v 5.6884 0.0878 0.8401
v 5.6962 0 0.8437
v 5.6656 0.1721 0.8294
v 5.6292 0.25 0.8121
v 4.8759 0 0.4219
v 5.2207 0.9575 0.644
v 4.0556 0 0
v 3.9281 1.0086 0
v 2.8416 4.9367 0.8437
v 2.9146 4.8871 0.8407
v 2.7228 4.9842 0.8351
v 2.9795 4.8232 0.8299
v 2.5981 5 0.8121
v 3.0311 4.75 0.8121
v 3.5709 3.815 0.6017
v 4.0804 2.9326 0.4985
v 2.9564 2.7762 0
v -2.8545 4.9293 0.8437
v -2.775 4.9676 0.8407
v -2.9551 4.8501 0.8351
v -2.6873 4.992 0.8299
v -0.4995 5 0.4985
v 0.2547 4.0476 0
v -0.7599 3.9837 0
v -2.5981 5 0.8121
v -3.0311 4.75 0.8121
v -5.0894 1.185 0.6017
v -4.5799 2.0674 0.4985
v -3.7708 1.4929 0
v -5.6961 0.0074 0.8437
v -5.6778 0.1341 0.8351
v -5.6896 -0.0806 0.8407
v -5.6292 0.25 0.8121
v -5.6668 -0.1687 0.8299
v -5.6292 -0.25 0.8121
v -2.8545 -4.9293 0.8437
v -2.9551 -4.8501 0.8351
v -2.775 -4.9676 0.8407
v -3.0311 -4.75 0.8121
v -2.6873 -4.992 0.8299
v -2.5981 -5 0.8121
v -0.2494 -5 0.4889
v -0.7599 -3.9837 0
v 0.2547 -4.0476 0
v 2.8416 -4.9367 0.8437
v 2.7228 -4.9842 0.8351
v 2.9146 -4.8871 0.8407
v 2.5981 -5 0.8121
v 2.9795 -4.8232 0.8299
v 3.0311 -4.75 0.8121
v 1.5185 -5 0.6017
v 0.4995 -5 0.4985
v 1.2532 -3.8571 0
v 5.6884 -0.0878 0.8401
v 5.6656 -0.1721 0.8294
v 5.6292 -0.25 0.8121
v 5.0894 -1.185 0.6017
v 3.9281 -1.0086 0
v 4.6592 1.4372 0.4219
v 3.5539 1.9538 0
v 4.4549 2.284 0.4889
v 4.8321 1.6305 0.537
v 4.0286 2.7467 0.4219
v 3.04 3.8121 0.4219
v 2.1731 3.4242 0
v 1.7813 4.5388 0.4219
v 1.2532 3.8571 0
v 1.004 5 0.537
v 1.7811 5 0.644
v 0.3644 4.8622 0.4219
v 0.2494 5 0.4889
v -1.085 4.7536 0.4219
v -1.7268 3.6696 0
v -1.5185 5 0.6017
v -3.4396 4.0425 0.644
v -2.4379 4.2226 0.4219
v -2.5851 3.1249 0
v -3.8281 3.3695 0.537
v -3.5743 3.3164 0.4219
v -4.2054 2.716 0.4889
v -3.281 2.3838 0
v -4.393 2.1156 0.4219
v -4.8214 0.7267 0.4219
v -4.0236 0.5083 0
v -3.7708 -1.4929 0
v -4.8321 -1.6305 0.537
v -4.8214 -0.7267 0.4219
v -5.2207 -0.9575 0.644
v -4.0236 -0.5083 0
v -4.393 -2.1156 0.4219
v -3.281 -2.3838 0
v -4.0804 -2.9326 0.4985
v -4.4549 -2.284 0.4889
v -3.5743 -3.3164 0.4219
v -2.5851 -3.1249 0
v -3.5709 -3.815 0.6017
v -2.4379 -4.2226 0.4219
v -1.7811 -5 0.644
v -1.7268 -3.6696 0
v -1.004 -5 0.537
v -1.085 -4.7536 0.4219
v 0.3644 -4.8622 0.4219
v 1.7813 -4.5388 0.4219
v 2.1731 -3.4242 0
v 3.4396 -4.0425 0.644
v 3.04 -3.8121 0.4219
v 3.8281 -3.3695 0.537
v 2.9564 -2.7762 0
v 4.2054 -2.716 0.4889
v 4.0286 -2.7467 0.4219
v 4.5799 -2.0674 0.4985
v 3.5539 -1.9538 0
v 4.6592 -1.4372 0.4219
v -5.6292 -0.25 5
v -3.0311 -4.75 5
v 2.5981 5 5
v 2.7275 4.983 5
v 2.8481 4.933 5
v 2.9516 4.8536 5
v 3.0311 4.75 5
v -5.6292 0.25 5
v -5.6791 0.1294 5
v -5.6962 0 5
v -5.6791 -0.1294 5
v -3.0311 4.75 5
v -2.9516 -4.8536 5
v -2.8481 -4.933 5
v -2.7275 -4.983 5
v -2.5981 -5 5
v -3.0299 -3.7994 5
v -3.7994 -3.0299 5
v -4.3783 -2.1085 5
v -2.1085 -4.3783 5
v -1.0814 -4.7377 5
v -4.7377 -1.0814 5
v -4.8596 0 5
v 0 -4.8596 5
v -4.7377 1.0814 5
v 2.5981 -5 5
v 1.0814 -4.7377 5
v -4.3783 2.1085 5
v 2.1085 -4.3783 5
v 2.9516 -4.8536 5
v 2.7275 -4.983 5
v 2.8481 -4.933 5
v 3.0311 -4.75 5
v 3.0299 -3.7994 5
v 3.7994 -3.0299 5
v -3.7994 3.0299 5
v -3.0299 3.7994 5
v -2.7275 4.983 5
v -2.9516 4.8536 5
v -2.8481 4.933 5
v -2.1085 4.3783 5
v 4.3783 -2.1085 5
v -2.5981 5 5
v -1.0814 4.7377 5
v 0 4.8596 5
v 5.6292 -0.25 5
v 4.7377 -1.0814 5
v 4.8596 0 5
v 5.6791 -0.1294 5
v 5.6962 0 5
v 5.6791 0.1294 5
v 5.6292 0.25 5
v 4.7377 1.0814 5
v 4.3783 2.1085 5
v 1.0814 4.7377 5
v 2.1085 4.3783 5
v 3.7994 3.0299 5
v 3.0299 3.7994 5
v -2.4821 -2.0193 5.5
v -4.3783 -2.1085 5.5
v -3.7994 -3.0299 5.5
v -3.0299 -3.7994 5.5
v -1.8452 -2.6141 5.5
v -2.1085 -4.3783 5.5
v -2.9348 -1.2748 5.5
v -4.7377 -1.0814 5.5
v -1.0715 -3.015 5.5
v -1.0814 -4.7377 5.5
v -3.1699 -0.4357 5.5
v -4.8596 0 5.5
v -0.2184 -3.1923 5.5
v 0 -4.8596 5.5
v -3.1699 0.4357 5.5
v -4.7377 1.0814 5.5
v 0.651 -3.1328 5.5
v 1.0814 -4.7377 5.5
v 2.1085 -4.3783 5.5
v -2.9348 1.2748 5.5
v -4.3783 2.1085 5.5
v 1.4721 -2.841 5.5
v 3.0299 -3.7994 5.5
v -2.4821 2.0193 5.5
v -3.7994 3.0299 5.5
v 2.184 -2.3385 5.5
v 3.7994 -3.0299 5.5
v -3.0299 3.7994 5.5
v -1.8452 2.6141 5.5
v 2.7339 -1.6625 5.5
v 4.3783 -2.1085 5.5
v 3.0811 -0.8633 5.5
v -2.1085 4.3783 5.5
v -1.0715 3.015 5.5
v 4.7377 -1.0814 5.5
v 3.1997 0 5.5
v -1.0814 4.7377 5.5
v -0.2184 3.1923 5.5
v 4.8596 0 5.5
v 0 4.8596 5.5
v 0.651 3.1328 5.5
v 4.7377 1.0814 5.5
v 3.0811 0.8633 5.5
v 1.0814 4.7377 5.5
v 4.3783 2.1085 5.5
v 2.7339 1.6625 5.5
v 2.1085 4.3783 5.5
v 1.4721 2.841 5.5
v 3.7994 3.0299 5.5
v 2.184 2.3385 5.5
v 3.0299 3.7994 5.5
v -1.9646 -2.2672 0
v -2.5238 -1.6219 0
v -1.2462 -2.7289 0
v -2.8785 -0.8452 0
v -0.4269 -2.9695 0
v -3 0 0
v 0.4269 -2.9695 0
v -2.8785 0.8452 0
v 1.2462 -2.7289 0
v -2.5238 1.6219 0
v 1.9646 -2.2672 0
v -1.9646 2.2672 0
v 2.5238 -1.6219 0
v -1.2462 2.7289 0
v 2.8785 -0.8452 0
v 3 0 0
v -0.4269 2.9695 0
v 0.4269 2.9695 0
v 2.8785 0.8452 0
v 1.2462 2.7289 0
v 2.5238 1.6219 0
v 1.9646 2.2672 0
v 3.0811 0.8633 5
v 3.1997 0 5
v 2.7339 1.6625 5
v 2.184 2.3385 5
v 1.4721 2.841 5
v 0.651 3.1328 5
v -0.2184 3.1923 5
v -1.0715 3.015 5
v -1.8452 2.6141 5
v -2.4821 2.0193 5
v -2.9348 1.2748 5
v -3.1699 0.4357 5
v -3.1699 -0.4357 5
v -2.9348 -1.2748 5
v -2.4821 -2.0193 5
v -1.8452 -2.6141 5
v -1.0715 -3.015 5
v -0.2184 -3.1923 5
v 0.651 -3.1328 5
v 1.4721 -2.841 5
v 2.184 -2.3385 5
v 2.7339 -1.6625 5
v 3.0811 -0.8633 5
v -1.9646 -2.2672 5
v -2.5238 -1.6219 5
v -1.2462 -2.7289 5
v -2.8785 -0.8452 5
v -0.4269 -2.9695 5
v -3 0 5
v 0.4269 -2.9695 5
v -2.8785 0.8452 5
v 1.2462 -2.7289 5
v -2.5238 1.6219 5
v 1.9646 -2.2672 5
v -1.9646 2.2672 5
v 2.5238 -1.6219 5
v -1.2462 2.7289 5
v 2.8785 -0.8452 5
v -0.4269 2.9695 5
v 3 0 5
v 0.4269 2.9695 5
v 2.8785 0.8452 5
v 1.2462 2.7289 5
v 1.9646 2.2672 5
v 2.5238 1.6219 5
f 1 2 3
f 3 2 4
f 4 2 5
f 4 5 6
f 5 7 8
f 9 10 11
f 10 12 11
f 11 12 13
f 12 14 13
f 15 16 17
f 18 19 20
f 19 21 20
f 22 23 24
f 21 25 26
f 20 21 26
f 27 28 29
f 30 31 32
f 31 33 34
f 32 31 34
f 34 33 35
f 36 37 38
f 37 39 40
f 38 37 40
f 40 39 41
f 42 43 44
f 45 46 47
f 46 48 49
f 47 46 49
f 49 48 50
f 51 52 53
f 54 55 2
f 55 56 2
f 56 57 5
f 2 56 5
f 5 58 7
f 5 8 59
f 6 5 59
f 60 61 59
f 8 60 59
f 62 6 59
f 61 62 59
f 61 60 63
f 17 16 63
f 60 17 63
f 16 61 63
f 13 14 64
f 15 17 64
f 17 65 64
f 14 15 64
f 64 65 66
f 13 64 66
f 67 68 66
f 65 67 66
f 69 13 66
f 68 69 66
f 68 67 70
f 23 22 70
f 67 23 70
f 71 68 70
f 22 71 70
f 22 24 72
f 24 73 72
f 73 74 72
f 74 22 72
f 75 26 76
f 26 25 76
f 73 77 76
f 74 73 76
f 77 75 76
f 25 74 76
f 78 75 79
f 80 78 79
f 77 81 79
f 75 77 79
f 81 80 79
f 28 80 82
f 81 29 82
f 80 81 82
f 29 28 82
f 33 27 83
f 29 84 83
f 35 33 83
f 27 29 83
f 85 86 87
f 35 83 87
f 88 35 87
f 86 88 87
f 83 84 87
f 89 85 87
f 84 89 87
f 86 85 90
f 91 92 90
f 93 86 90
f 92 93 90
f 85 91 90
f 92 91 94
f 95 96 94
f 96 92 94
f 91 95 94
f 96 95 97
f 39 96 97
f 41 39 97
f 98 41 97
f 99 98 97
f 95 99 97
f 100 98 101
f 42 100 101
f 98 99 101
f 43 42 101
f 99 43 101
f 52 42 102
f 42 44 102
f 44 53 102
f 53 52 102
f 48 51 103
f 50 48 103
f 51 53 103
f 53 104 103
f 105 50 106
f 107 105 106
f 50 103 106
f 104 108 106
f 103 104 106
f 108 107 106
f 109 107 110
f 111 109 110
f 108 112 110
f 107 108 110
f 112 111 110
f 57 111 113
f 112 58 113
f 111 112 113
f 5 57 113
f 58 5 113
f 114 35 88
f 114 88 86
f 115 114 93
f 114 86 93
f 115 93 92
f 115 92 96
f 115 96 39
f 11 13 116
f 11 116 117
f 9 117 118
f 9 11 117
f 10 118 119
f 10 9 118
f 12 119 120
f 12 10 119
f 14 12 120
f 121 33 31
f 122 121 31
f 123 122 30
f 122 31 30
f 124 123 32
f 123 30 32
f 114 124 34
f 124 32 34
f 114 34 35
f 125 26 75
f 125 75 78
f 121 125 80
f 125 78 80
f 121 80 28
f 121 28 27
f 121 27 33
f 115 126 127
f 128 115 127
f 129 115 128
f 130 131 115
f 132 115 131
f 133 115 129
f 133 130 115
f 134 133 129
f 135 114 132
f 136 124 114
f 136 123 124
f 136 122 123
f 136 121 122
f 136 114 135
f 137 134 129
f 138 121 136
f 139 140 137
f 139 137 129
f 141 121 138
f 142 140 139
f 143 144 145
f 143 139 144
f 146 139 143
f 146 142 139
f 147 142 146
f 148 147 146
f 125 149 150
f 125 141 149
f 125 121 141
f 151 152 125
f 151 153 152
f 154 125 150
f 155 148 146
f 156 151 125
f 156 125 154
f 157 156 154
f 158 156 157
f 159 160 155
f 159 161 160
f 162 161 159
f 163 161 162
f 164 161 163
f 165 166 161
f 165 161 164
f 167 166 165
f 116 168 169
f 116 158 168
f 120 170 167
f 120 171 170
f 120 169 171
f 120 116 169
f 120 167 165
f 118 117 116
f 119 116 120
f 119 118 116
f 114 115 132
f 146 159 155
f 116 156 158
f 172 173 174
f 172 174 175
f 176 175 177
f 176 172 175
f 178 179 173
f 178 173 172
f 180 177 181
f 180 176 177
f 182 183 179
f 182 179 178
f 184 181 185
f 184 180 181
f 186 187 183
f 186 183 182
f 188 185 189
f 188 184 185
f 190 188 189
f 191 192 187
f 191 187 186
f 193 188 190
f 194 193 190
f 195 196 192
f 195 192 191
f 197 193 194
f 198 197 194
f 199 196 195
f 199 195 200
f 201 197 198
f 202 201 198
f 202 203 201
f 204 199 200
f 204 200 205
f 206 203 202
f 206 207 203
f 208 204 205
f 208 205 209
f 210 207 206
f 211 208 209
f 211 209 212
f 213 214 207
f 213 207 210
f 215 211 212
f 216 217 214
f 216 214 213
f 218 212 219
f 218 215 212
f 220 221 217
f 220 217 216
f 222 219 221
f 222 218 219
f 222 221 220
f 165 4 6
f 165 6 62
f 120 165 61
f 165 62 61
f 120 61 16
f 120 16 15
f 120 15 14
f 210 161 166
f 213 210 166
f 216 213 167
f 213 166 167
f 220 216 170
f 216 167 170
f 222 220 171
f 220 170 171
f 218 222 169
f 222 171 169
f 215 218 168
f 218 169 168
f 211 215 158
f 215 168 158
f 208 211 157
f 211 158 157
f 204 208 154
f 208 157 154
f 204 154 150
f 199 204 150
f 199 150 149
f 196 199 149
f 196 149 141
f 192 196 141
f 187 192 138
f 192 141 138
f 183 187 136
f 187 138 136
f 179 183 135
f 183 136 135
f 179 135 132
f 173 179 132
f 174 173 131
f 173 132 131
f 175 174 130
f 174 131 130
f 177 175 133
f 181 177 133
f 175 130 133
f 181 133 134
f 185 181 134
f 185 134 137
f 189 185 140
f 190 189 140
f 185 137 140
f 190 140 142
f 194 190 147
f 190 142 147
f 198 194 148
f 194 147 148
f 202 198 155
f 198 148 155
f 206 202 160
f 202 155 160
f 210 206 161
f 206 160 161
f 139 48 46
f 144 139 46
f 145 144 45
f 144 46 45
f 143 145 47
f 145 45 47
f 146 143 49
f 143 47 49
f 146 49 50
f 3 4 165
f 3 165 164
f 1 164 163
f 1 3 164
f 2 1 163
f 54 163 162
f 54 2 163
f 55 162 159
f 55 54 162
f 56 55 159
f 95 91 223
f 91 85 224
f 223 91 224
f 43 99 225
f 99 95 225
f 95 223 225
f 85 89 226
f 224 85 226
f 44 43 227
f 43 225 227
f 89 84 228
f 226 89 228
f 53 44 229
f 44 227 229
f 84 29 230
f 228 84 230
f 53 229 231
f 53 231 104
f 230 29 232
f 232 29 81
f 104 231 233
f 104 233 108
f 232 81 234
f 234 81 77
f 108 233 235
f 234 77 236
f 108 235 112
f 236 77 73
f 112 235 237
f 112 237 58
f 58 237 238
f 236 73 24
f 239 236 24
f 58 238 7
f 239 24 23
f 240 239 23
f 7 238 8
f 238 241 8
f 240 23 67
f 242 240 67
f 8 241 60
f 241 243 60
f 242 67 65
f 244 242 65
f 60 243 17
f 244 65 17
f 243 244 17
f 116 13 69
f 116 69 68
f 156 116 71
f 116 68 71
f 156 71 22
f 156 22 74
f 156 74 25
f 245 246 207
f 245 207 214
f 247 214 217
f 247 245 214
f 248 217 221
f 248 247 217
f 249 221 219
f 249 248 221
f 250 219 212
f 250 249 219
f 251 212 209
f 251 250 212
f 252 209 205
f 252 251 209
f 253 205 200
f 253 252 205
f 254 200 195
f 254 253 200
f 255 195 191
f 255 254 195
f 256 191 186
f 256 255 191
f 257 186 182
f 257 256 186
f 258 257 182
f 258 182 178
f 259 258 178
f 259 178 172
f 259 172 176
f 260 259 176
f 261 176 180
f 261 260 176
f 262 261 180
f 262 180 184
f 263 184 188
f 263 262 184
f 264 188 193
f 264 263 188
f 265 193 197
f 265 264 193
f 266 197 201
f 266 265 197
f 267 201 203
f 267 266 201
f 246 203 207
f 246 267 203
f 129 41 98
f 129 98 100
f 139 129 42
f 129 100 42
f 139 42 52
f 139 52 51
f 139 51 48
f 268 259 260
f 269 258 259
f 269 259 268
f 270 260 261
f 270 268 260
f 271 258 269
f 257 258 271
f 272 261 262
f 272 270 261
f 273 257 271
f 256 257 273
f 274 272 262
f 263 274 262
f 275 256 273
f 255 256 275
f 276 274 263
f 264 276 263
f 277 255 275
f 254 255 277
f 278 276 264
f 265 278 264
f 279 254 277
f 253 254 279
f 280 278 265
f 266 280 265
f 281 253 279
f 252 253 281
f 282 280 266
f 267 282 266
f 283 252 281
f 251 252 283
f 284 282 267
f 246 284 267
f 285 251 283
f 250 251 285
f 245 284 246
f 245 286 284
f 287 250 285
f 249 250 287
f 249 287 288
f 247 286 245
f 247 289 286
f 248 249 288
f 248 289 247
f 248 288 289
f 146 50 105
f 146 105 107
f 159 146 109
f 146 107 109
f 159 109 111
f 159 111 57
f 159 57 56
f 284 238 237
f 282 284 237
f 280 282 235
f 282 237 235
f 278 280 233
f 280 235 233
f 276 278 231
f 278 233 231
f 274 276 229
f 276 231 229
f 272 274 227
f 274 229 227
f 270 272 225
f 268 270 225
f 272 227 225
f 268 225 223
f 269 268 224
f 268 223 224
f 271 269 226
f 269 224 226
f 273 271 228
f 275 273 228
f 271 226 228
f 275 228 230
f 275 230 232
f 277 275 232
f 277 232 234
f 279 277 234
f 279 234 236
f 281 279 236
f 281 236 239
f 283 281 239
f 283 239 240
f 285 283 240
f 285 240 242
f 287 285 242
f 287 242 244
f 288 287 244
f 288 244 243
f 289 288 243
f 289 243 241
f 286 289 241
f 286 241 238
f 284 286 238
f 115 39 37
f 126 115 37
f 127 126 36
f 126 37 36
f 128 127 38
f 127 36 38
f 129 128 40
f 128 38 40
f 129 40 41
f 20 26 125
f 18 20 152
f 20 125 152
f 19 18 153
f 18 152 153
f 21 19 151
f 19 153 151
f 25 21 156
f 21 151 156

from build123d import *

# Parameters (mm, degrees)
F1_DEPTH    = 5
F4_R        = 3
F5_DEPTH    = 5.001
F6_R        = 0.5
F7_T1_DEPTH = 5.5598599904
F9_R        = 4.8595532258
F9_R_2      = 3.1997304912
F10_DEPTH   = 0.5


# Not quite as in the source:
# - a fillet or chamfer that OpenCascade refuses, or shapes differently, is made with other operations: its cross-section is extruded or revolved along the edge and cut away or added


with BuildPart() as f1:
    # F0 (on Top) → F1 (new body)
    with BuildSketch(Plane.XY):
        Polygon((-2.8867513459, 5), (-5.7735026919, 0), (-2.8867513459, -5), (2.8867513459, -5), (5.7735026919, 0), (2.8867513459, 5), align=None)
    extrude(amount=F1_DEPTH)

    # F2 (on Front) → F3 (revolve, cut)
    with BuildSketch(Plane.XZ):
        Polygon((6, 1), (3.5, -0.285714148), (6, -0.285714148), align=None)
    revolve(axis=Axis((0, 0, 1.7616122495), (0, 0, 1)), mode=Mode.SUBTRACT)

    # F4 (on face) → F5 (cut, through all)
    with BuildSketch(Plane(origin=(0, 0, 0), x_dir=(1, 0, 0), z_dir=(0, 0, -1))):
        Circle(F4_R)
    extrude(amount=-F5_DEPTH, mode=Mode.SUBTRACT)

    # F6
    f6_edges = [f1.edges().sort_by_distance(p)[0] for p in [
        (-2.886751, 5, 2.941758),
    ]]
    fillet(f6_edges, radius=F6_R)

    # F7: fillet of radius 0.5 on 5 edges, made by hand

    # F7_s2 → F7_t1 (cut)
    with BuildSketch(Plane.XY.offset(0.1618278461)):
        with BuildLine():
            ThreePointArc((-5.6291651246, 0.25), (-5.6961524227, 0), (-5.6291651246, -0.25))
            Line((-5.6291651246, -0.25), (-5.7735026919, 0))
            Line((-5.7735026919, 0), (-5.6291651246, 0.25))
        make_face()
        with BuildLine():
            ThreePointArc((-3.0310889132, -4.75), (-2.8480762114, -4.9330127019), (-2.5980762114, -5))
            Line((-2.5980762114, -5), (-2.8867513459, -5))
            Line((-2.8867513459, -5), (-3.0310889132, -4.75))
        make_face()
        with BuildLine():
            ThreePointArc((2.5980762114, -5), (2.8480762114, -4.9330127019), (3.0310889132, -4.75))
            Line((3.0310889132, -4.75), (2.8867513459, -5))
            Line((2.8867513459, -5), (2.5980762114, -5))
        make_face()
        with BuildLine():
            ThreePointArc((5.6291651246, 0.25), (5.6961524227, 0), (5.6291651246, -0.25))
            Line((5.6291651246, -0.25), (5.7735026919, 0))
            Line((5.7735026919, 0), (5.6291651246, 0.25))
        make_face()
        with BuildLine():
            ThreePointArc((2.5980762114, 5), (2.8480762114, 4.9330127019), (3.0310889132, 4.75))
            Line((3.0310889132, 4.75), (2.8867513459, 5))
            Line((2.8867513459, 5), (2.5980762114, 5))
        make_face()
    extrude(amount=F7_T1_DEPTH, mode=Mode.SUBTRACT)

    # F9 (on face) → F10 (join)
    with BuildSketch(Plane.XY.offset(5)):
        Circle(F9_R)
        Circle(F9_R_2, mode=Mode.SUBTRACT)
    extrude(amount=F10_DEPTH)


solid = f1.part
